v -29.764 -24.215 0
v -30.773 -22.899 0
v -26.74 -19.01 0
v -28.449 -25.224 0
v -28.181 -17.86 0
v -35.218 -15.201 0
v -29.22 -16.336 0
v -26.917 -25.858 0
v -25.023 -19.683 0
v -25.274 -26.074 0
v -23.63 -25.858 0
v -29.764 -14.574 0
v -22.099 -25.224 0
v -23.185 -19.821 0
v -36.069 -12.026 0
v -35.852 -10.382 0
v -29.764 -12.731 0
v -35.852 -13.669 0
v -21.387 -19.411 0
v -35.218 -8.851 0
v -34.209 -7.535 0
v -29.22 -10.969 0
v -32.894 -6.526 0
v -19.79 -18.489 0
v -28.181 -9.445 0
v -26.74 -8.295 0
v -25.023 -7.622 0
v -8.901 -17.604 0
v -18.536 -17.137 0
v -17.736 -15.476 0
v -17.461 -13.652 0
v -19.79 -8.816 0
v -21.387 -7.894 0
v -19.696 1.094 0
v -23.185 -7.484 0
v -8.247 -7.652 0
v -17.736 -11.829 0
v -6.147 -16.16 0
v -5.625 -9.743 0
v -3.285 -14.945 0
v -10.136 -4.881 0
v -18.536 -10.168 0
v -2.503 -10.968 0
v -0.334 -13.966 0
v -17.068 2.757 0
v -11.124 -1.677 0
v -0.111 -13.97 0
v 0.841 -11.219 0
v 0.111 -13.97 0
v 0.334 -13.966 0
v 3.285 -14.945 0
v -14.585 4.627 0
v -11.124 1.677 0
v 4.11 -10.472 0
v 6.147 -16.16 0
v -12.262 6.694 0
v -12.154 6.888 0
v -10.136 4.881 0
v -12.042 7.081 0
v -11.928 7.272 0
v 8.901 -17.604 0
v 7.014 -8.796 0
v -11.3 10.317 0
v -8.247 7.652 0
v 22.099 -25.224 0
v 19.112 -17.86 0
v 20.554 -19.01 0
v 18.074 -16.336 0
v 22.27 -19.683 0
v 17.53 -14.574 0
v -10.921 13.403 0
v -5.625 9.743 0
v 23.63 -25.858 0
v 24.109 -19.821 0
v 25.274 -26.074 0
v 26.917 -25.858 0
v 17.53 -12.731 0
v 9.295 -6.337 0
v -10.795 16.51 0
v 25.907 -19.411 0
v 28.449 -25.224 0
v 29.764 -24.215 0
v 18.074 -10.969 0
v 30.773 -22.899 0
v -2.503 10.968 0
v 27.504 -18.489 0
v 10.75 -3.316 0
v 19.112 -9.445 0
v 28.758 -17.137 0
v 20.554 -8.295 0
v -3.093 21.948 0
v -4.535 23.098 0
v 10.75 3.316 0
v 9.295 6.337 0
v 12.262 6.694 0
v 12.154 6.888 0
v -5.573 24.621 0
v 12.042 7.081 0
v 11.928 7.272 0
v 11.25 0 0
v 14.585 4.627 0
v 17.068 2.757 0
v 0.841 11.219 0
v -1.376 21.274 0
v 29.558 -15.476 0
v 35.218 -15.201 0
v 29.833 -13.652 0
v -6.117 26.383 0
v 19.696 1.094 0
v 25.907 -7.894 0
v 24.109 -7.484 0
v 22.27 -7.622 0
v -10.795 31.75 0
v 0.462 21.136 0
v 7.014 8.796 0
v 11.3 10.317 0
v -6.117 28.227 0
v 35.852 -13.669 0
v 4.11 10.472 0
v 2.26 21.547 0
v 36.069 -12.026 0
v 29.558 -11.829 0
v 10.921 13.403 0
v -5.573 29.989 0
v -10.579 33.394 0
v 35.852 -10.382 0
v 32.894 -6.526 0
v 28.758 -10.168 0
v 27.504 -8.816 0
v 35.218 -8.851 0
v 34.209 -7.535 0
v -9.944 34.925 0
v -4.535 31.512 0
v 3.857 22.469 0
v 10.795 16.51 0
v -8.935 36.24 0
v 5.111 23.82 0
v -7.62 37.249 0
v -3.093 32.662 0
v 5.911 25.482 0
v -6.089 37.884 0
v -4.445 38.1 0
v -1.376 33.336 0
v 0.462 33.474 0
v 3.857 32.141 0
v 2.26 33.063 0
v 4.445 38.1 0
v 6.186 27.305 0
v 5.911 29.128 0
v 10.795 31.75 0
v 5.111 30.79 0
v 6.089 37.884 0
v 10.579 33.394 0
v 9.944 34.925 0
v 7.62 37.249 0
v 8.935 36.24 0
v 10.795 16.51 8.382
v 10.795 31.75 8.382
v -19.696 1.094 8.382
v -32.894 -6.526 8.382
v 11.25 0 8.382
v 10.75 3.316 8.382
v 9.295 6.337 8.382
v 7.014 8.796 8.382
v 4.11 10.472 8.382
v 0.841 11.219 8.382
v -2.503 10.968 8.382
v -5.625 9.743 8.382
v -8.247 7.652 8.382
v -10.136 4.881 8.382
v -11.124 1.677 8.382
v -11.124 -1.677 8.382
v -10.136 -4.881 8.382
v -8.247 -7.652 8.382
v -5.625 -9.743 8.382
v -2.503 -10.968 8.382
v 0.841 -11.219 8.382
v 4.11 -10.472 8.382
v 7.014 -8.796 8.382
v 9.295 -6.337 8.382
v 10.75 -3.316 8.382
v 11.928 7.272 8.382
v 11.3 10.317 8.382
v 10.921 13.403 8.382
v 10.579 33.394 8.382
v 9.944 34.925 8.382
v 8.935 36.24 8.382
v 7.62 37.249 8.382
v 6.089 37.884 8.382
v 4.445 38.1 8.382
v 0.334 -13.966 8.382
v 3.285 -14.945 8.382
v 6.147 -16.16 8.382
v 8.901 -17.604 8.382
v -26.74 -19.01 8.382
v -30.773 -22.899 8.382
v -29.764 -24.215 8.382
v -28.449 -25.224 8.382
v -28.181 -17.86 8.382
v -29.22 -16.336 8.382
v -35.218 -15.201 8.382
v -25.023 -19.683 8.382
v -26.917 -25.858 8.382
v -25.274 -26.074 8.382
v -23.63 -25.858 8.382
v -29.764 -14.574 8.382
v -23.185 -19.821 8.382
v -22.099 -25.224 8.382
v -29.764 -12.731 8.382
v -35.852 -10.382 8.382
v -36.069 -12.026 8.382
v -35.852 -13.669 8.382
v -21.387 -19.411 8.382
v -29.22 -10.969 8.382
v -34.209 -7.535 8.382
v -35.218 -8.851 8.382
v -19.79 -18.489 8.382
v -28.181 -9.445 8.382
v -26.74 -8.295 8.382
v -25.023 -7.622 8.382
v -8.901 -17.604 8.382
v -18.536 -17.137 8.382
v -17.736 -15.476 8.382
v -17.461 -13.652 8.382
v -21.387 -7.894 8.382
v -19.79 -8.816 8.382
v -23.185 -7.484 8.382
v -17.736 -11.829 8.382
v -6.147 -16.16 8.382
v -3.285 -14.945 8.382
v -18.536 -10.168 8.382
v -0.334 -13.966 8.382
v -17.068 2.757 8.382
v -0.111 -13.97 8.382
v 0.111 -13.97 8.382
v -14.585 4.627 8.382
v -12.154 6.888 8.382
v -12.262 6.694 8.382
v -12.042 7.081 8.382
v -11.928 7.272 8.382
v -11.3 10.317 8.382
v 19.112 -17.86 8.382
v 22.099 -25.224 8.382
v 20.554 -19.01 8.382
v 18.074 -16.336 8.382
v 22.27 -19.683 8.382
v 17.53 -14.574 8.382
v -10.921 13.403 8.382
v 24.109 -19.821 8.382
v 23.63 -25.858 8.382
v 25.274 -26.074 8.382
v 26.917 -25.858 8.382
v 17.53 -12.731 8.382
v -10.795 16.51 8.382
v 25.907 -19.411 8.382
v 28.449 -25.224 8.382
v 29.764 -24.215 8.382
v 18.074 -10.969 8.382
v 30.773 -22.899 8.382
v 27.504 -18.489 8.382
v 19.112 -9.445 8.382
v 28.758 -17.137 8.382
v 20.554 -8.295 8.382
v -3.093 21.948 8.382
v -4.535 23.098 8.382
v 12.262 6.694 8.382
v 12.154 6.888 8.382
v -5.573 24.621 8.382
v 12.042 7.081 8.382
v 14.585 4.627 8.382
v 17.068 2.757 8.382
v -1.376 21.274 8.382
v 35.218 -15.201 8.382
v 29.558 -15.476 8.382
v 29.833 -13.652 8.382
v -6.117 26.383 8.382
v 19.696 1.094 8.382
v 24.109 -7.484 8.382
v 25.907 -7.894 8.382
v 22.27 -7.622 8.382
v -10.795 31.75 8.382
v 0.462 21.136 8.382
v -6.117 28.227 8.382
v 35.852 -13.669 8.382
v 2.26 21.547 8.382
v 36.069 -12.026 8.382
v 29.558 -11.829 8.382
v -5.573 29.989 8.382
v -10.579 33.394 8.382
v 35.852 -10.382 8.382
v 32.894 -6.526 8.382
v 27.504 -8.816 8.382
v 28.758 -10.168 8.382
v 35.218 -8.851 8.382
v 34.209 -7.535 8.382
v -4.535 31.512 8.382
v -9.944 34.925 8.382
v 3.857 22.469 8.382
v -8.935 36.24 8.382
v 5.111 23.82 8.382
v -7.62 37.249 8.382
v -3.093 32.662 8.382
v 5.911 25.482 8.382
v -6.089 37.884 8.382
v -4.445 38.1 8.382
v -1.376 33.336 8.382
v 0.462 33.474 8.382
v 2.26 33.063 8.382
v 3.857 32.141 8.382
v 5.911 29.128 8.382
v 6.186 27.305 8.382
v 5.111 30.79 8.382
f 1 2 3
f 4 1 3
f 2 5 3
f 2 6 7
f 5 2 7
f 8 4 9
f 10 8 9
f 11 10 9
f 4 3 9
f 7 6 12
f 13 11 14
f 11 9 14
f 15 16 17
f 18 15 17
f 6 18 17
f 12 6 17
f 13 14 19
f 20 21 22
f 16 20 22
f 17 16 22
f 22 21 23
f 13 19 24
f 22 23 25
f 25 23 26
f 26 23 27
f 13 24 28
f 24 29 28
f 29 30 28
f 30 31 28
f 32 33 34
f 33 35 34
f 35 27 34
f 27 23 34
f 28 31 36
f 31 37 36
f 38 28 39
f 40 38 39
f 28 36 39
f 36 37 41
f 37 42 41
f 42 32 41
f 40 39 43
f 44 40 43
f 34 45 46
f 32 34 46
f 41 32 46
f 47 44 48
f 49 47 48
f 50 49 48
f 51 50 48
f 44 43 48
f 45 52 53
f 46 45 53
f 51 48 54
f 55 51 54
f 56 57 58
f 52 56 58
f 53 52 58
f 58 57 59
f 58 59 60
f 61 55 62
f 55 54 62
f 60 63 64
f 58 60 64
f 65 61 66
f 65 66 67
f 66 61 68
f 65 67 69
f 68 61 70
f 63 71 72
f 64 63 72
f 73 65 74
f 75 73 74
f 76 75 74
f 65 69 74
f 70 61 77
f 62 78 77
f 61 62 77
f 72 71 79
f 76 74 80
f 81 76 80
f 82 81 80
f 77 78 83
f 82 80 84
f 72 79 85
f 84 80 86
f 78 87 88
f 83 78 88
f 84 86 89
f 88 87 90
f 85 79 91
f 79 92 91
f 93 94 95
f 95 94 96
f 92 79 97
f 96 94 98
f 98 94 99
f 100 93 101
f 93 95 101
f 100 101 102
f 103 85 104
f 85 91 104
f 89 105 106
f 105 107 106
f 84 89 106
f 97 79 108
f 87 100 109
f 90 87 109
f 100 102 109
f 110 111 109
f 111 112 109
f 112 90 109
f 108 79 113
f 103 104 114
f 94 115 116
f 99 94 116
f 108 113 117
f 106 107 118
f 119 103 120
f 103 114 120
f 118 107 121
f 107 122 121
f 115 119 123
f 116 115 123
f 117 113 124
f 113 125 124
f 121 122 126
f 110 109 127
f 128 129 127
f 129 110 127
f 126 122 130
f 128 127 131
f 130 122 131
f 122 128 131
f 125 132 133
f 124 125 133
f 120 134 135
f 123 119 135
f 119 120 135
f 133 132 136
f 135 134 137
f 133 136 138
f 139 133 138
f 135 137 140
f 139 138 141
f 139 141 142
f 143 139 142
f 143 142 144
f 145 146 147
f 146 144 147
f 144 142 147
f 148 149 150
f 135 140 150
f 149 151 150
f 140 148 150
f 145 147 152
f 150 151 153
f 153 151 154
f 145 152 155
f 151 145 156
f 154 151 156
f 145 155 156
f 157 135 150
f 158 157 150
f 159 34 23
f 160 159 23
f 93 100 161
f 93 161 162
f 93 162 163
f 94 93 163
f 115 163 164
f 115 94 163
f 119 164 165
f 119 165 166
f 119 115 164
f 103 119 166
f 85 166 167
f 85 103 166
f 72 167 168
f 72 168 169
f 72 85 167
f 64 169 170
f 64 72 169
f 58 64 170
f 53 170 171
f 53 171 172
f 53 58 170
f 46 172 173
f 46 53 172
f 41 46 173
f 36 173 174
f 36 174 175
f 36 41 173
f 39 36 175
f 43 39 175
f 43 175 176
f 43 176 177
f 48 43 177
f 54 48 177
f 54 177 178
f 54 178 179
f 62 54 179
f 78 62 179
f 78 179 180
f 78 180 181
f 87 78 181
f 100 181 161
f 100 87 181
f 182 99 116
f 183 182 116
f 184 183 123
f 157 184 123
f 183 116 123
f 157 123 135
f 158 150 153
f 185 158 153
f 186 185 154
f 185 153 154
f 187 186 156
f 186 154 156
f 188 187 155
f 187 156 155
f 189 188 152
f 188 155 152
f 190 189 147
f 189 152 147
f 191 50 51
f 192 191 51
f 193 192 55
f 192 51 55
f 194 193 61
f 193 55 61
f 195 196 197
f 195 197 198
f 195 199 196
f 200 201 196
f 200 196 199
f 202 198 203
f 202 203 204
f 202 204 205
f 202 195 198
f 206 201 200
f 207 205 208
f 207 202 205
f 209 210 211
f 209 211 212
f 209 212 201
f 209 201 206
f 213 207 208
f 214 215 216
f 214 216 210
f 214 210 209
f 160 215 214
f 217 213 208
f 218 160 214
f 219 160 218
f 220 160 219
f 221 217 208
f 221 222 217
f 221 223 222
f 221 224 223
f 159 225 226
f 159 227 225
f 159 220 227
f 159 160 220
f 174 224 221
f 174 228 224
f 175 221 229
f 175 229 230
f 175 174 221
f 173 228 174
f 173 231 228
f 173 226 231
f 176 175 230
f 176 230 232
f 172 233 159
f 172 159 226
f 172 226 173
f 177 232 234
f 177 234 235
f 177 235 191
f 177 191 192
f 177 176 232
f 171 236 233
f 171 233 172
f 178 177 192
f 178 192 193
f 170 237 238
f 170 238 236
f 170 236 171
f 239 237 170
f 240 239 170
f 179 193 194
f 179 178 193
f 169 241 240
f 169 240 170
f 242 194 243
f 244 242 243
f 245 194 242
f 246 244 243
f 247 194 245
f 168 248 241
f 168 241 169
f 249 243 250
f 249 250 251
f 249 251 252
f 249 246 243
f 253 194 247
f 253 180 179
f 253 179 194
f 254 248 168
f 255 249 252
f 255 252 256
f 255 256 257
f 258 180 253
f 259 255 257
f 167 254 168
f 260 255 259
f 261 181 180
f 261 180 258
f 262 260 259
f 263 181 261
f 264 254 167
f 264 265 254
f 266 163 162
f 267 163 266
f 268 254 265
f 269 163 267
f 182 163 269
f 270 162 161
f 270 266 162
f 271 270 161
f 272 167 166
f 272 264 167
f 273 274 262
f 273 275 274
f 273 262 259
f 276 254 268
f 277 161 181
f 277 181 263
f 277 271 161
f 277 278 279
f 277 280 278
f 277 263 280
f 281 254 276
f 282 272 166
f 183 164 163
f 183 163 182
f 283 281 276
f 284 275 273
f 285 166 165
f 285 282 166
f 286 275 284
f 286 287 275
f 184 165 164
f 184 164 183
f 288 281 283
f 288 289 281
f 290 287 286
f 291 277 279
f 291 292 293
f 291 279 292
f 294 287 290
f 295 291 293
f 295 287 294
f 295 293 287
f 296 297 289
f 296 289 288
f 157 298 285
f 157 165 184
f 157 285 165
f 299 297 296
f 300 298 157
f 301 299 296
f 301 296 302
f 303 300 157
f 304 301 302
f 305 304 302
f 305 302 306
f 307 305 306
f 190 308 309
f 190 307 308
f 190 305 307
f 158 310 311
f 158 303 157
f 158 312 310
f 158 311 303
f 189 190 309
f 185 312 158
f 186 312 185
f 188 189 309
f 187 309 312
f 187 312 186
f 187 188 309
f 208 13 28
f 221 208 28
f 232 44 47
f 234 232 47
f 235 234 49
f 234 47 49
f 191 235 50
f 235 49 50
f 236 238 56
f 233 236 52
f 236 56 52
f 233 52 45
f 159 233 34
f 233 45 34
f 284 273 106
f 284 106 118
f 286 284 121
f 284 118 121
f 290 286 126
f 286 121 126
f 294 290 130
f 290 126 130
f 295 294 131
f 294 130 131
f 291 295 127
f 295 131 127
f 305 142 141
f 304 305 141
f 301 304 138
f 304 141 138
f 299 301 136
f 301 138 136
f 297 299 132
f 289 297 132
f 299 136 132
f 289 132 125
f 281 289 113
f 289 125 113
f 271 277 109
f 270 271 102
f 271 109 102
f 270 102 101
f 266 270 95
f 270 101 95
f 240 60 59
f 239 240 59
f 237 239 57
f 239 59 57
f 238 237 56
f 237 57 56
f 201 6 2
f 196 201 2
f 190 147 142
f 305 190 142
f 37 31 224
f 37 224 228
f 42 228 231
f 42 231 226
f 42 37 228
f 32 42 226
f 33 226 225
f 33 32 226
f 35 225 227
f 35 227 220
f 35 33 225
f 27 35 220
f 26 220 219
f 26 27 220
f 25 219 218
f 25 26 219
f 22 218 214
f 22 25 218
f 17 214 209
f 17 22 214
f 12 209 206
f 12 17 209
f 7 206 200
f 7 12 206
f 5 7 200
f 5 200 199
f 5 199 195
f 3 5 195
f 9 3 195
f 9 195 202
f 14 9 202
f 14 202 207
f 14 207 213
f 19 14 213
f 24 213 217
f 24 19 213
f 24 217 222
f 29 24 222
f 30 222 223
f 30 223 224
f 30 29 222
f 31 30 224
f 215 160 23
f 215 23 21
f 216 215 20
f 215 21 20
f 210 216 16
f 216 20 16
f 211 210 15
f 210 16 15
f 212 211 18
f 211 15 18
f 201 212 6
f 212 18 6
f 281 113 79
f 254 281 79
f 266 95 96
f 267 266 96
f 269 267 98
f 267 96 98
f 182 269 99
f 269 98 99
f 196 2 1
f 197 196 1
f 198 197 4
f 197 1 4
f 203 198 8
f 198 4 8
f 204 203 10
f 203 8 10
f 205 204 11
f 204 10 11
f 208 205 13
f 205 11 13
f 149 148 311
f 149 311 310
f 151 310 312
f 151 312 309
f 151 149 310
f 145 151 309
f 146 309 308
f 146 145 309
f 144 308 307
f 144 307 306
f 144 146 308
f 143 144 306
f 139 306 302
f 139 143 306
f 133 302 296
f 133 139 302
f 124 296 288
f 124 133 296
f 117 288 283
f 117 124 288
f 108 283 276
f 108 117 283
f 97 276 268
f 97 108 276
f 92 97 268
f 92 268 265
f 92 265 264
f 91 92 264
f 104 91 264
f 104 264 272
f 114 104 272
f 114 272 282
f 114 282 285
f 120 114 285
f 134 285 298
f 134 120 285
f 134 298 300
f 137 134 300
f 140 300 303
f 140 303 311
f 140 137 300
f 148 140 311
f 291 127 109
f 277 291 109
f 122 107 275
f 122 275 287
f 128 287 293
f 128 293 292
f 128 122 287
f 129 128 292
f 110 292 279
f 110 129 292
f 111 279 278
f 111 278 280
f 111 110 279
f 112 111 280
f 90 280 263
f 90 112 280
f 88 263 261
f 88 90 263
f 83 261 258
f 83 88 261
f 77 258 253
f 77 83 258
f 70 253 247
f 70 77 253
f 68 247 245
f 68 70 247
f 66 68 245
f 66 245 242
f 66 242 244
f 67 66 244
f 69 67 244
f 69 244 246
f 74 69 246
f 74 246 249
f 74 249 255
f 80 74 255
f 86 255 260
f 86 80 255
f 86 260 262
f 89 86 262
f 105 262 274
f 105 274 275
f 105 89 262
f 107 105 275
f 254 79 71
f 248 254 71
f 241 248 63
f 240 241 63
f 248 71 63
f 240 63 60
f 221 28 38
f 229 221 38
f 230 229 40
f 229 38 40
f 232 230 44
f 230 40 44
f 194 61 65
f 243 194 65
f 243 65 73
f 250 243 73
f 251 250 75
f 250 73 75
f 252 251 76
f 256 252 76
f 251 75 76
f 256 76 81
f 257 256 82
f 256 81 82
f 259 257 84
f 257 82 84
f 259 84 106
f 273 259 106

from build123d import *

# Parameters (mm, degrees)
F0_R     = 6.185827
F0_R_2   = 11.25
F1_DEPTH = 8.382


with BuildPart() as f1:
    # F0 (on Top) → F1 (new body)
    with BuildSketch(Plane.XY):
        with BuildLine():
            ThreePointArc((-10.795, 16.51), (-11.079307, 11.856451), (-11.927998, 7.272122))
            ThreePointArc((-11.927998, 7.272122), (-12.098375, 6.985), (-12.261842, 6.693888))
            ThreePointArc((-12.261842, 6.693888), (-15.807641, 3.666735), (-19.695579, 1.093744))
            Line((-19.695579, 1.093744), (-32.893807, -6.526256))
            ThreePointArc((-32.893807, -6.526256), (-35.852436, -10.382016), (-35.218068, -15.200517))
            Line((-35.218068, -15.200517), (-30.773068, -22.899483))
            ThreePointArc((-30.773068, -22.899483), (-26.917308, -25.858112), (-22.098807, -25.223744))
            Line((-22.098807, -25.223744), (-8.900579, -17.603744))
            ThreePointArc((-8.900579, -17.603744), (-4.728335, -15.523187), (-0.333844, -13.96601))
            ThreePointArc((-0.333844, -13.96601), (0, -13.97), (0.333844, -13.96601))
            ThreePointArc((0.333844, -13.96601), (4.728335, -15.523187), (8.900579, -17.603744))
            Line((8.900579, -17.603744), (22.098807, -25.223744))
            ThreePointArc((22.098807, -25.223744), (26.917308, -25.858112), (30.773068, -22.899483))
            Line((30.773068, -22.899483), (35.218068, -15.200517))
            ThreePointArc((35.218068, -15.200517), (35.852436, -10.382016), (32.893807, -6.526256))
            Line((32.893807, -6.526256), (19.695579, 1.093744))
            ThreePointArc((19.695579, 1.093744), (15.807641, 3.666735), (12.261842, 6.693888))
            ThreePointArc((12.261842, 6.693888), (12.098375, 6.985), (11.927998, 7.272122))
            ThreePointArc((11.927998, 7.272122), (11.079307, 11.856451), (10.795, 16.51))
            Line((10.795, 16.51), (10.795, 31.75))
            ThreePointArc((10.795, 31.75), (8.935128, 36.240128), (4.445, 38.1))
            Line((4.445, 38.1), (-4.445, 38.1))
            ThreePointArc((-4.445, 38.1), (-8.935128, 36.240128), (-10.795, 31.75))
            Line((-10.795, 31.75), (-10.795, 16.51))
        make_face()
        with Locations((-23.646824, -13.6525)):
            Circle(F0_R, mode=Mode.SUBTRACT)
        with Locations((23.646824, -13.6525)):
            Circle(F0_R, mode=Mode.SUBTRACT)
        Circle(F0_R_2, mode=Mode.SUBTRACT)
        with Locations((0, 27.305)):
            Circle(F0_R, mode=Mode.SUBTRACT)
    extrude(amount=F1_DEPTH)


solid = f1.part
